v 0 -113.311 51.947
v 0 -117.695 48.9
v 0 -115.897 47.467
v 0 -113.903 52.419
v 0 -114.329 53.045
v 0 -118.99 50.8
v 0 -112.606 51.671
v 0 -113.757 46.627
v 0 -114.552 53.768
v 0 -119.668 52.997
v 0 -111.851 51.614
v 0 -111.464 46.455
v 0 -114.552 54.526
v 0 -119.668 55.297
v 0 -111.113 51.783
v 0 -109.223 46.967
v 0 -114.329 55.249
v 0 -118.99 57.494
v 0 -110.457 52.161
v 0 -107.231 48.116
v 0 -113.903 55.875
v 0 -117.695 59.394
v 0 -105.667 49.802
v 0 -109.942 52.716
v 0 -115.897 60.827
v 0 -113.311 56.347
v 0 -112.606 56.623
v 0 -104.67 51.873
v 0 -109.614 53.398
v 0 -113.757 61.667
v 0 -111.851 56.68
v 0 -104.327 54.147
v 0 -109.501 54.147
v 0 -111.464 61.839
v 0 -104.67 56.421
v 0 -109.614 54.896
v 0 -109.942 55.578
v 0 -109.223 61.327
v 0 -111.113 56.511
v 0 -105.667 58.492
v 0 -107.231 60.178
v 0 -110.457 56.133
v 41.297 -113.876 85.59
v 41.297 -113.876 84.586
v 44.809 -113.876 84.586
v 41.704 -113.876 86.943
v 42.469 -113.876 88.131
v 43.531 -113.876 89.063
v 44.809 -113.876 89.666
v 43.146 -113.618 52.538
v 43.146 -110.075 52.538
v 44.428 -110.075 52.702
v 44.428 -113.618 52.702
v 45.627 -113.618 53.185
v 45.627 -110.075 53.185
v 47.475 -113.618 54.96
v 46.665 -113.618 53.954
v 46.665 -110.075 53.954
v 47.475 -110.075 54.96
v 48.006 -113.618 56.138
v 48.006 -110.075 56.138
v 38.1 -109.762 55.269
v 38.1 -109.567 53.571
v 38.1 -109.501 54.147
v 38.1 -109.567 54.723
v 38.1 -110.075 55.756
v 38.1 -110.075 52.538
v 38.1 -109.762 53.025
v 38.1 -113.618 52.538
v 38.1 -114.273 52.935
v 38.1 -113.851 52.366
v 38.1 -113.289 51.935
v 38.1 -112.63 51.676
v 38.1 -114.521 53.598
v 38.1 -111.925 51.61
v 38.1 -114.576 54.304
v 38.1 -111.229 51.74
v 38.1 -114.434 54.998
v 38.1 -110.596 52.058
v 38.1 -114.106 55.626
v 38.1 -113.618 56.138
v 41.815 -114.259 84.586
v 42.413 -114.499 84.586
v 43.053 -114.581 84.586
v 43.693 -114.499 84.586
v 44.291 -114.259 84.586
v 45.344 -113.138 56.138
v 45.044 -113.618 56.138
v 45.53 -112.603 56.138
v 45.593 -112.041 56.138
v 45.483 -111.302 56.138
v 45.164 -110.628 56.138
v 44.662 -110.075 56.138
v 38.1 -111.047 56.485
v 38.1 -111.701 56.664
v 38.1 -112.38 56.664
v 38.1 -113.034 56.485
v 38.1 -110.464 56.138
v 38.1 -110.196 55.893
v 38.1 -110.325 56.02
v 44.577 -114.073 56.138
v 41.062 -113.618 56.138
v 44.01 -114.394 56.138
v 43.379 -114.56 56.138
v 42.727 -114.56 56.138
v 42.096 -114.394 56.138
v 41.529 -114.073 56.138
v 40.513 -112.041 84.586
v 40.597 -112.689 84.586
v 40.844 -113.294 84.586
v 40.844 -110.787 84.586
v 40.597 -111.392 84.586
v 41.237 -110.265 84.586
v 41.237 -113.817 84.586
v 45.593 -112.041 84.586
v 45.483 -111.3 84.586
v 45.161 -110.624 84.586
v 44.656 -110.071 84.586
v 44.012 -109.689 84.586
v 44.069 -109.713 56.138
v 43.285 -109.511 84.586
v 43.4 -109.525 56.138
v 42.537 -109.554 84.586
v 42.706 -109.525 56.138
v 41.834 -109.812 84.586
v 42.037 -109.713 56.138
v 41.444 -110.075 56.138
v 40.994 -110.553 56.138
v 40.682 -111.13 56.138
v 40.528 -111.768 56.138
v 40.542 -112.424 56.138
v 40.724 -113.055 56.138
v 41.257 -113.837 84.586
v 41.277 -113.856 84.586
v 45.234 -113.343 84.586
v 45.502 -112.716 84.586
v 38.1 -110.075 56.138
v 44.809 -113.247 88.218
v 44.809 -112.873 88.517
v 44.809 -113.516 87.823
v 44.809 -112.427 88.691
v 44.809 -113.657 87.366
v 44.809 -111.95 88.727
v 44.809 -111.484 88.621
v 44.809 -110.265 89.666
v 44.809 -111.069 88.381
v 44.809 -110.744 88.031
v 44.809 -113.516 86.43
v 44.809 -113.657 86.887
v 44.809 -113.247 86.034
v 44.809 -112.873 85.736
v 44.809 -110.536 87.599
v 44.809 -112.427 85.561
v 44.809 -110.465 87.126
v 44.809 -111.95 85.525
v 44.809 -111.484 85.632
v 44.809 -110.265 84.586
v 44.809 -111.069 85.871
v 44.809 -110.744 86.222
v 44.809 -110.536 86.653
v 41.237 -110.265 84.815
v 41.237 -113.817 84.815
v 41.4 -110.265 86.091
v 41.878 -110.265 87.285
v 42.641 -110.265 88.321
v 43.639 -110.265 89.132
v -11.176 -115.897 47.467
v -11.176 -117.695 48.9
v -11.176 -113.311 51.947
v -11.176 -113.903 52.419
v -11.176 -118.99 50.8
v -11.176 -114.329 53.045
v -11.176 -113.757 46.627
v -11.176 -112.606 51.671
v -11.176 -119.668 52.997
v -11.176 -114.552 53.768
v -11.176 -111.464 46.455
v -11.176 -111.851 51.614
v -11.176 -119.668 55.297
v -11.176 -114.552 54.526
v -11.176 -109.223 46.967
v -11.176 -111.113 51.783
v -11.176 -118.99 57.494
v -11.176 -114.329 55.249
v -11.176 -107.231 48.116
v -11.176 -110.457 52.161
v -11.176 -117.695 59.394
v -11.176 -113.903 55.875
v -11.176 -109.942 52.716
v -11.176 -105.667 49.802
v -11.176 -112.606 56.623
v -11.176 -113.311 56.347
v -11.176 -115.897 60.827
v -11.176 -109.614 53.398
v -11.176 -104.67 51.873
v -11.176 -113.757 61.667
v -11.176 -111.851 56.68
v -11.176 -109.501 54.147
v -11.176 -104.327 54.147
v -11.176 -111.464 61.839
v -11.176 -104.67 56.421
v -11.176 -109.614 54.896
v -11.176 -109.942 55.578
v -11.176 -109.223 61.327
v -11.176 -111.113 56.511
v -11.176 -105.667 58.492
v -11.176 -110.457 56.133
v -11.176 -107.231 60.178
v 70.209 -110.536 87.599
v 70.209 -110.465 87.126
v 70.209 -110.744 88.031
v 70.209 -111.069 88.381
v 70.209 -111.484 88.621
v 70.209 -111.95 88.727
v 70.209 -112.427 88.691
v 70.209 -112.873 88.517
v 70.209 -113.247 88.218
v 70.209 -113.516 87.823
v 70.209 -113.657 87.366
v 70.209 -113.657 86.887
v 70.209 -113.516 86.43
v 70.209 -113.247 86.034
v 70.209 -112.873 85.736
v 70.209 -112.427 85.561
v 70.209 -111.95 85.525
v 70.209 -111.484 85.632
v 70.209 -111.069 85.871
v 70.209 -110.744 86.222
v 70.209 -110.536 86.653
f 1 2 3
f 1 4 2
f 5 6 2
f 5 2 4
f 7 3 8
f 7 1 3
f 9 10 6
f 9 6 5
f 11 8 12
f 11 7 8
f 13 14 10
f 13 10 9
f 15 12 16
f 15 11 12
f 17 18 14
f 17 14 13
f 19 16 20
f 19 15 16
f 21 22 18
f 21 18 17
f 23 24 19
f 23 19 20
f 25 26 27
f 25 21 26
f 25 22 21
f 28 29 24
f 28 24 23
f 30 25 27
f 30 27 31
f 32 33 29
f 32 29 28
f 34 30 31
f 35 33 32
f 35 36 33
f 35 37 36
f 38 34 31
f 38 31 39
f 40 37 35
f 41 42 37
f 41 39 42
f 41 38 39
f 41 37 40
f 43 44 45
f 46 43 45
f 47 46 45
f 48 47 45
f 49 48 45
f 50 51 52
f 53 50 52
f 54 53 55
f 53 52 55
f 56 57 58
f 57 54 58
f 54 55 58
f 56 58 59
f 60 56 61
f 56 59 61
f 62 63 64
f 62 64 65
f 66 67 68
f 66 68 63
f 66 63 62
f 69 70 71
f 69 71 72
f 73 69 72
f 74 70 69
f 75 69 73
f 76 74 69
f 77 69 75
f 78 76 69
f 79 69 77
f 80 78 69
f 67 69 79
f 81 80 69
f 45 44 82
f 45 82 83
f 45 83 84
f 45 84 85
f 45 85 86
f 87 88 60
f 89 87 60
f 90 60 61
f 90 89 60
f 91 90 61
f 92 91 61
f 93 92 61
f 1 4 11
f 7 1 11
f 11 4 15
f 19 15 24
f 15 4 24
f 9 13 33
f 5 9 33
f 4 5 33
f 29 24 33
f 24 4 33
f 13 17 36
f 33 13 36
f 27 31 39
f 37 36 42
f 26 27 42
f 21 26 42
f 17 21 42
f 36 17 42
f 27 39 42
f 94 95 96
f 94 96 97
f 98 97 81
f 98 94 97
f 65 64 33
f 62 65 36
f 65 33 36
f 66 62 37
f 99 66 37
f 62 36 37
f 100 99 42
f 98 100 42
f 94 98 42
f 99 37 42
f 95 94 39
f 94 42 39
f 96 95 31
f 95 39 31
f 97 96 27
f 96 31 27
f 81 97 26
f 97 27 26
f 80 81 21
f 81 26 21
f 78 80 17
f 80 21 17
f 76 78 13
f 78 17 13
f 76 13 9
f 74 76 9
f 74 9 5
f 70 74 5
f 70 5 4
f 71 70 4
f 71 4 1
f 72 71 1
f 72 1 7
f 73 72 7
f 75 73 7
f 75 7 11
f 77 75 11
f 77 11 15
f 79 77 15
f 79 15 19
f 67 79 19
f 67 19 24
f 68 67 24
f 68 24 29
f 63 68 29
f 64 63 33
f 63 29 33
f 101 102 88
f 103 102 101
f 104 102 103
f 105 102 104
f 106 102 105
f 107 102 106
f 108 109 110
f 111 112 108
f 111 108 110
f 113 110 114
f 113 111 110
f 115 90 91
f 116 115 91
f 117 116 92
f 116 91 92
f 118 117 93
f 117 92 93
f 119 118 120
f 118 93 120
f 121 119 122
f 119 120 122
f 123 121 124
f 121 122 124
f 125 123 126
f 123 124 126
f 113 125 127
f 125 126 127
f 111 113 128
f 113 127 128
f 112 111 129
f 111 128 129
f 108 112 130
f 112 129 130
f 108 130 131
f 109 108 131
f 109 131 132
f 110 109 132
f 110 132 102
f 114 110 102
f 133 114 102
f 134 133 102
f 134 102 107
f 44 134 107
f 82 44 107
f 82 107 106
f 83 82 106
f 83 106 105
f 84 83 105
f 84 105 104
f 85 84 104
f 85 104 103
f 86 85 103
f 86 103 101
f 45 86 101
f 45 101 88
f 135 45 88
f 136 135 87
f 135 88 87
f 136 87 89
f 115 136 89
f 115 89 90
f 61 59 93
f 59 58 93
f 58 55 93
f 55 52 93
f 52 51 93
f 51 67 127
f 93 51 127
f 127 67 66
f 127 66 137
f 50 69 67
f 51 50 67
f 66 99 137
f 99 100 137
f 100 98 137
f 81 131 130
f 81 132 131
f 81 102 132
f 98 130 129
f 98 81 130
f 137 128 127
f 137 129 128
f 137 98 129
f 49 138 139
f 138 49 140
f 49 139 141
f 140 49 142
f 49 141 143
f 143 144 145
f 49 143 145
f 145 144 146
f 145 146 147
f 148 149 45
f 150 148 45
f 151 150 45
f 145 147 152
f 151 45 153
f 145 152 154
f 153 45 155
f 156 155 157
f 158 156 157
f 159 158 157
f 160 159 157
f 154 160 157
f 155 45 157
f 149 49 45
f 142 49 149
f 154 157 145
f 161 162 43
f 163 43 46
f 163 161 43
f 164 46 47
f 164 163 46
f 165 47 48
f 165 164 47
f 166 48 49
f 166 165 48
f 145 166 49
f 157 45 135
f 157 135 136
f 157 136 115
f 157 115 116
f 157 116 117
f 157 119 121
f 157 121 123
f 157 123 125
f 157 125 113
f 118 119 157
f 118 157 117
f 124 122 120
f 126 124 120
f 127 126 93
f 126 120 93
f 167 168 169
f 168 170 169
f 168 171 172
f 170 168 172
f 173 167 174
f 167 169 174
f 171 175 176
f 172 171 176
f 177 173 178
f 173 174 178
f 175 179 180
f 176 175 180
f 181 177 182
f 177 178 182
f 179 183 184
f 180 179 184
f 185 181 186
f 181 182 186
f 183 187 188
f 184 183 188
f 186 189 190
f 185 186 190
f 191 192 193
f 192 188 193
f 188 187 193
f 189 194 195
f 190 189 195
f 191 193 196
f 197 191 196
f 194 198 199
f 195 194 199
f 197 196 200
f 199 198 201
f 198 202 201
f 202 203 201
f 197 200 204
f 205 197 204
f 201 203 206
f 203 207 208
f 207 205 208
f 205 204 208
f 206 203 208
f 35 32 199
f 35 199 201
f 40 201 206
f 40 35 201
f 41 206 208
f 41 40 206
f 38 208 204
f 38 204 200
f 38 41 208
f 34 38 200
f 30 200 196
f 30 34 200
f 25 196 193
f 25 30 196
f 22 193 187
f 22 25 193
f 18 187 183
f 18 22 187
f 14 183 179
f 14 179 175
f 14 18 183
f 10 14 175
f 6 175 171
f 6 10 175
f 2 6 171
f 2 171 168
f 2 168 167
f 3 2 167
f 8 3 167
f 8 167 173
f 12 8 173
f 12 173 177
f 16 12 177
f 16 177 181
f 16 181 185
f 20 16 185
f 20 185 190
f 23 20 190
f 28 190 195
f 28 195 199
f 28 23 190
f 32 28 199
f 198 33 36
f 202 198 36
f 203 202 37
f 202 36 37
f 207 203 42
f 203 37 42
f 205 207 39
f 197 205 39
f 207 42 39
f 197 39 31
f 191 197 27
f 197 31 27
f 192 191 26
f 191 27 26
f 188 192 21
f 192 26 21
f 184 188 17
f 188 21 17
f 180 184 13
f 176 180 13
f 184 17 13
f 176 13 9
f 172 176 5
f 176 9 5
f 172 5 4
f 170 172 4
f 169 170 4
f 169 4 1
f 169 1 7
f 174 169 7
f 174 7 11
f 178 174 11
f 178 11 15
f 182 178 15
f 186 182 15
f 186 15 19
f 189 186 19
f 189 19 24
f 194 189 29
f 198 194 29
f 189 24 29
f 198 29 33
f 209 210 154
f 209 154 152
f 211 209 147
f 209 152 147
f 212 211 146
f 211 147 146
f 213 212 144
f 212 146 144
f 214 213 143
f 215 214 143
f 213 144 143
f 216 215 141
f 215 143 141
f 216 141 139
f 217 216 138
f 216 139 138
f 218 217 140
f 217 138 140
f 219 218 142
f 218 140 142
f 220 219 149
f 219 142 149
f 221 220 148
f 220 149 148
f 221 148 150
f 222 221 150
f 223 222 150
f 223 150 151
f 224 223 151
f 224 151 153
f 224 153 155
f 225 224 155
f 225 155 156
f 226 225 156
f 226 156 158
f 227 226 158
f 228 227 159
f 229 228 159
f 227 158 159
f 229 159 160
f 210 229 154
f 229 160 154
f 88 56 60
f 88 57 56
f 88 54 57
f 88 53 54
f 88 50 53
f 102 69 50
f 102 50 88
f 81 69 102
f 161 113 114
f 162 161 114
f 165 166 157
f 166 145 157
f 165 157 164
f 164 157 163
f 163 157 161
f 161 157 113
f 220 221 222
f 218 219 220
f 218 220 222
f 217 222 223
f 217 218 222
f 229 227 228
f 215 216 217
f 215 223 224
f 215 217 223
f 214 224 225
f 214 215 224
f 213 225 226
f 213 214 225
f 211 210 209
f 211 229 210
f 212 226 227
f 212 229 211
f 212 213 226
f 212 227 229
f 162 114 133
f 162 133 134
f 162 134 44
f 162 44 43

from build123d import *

# Parameters (mm, degrees)
F0_R         = 2.54
F1_DEPTH     = 38.1
F2_W         = 3.5423064731
F2_H         = 3.6002054004
F3_DEPTH     = 9.906
F4_T1_DEPTH  = 27.8407673004
F5_R         = 2.54
F6_DEPTH     = 28.448
F0_R_2       = 7.7136033571
F7_DEPTH     = 11.176
F9_DEPTH     = 5.08
F10_T1_DEPTH = 27.8075265616
F11_R        = 1.605342172
F12_DEPTH    = 25.4


# Not quite as in the source:
# - a fillet or chamfer that OpenCascade refuses, or shapes differently, is made with other operations: its cross-section is extruded or revolved along the edge and cut away or added


with BuildPart() as f1:
    # F0 (on Right) → F1 (new body)
    with BuildSketch(Plane.YZ):
        with Locations((-112.0406836271, 54.1470609605)):
            Circle(F0_R)
    extrude(amount=F1_DEPTH)

    # F2 (on face) → F3 (join)
    with BuildSketch(Plane.YZ.offset(38.1)):
        with Locations((-111.8464542239, 54.3381667436)):
            Rectangle(F2_W, F2_H)
    extrude(amount=F3_DEPTH)

    # F4: fillet of radius 5.08 on 1 edges, made by hand

    # F4_s2 → F4_t1 (cut)
    with BuildSketch(Plane.XZ.offset(97.9260705737)):
        with BuildLine():
            ThreePointArc((43.1463078345, 52.5380640434), (46.1702988592, 53.5361676357), (48.006, 56.1382694438))
            Line((48.006, 56.1382694438), (48.006, 52.5380640434))
            Line((48.006, 52.5380640434), (43.1463078345, 52.5380640434))
        make_face()
    extrude(amount=F4_T1_DEPTH, mode=Mode.SUBTRACT)

    # F5 (on face) → F6 (join)
    with BuildSketch(Plane.XY.offset(56.1382694438)):
        with Locations((43.053, -112.0406836271)):
            Circle(F5_R)
    extrude(amount=F6_DEPTH)

    # F8 (on face) → F9 (join)
    with BuildSketch(Plane.XY.offset(84.5862694438)):
        with BuildLine():
            Line((44.8093679455, -110.2645377603), (41.2372616213, -110.2645377603))
            Line((41.2372616213, -110.2645377603), (41.2372616213, -113.8168294939))
            ThreePointArc((41.2372616213, -113.8168294939), (41.2667054502, -113.8464388103), (41.2966320545, -113.8755600916))
            Line((41.2966320545, -113.8755600916), (44.8093679455, -113.8755600916))
            Line((44.8093679455, -113.8755600916), (44.8093679455, -110.2645377603))
        make_face()
    extrude(amount=F9_DEPTH)

    # F10: fillet of radius 5.08 on 1 edges, made by hand

    # F10_s2 → F10_t1 (cut)
    with BuildSketch(Plane.XZ.offset(98.1369203463)):
        with BuildLine():
            ThreePointArc((41.2372616213, 84.8152224782), (42.2266320932, 87.8273894828), (44.8093679455, 89.6662694438))
            Line((44.8093679455, 89.6662694438), (41.2372616213, 89.6662694438))
            Line((41.2372616213, 89.6662694438), (41.2372616213, 84.8152224782))
        make_face()
    extrude(amount=F10_T1_DEPTH, mode=Mode.SUBTRACT)

    # F11 (on face) → F12 (join)
    with BuildSketch(Plane.YZ.offset(44.8093679455)):
        with Locations((-112.070048926, 87.1262694438)):
            Circle(F11_R)
    extrude(amount=F12_DEPTH)


with BuildPart() as f7:
    # F0 (on Right) → F7 (new body)
    with BuildSketch(Plane.YZ):
        with Locations((-112.0406836271, 54.1470609605)):
            Circle(F0_R_2)
        with Locations((-112.0406836271, 54.1470609605)):
            Circle(F0_R, mode=Mode.SUBTRACT)
    extrude(amount=-F7_DEPTH)


solid = Compound([f1.part, f7.part])
